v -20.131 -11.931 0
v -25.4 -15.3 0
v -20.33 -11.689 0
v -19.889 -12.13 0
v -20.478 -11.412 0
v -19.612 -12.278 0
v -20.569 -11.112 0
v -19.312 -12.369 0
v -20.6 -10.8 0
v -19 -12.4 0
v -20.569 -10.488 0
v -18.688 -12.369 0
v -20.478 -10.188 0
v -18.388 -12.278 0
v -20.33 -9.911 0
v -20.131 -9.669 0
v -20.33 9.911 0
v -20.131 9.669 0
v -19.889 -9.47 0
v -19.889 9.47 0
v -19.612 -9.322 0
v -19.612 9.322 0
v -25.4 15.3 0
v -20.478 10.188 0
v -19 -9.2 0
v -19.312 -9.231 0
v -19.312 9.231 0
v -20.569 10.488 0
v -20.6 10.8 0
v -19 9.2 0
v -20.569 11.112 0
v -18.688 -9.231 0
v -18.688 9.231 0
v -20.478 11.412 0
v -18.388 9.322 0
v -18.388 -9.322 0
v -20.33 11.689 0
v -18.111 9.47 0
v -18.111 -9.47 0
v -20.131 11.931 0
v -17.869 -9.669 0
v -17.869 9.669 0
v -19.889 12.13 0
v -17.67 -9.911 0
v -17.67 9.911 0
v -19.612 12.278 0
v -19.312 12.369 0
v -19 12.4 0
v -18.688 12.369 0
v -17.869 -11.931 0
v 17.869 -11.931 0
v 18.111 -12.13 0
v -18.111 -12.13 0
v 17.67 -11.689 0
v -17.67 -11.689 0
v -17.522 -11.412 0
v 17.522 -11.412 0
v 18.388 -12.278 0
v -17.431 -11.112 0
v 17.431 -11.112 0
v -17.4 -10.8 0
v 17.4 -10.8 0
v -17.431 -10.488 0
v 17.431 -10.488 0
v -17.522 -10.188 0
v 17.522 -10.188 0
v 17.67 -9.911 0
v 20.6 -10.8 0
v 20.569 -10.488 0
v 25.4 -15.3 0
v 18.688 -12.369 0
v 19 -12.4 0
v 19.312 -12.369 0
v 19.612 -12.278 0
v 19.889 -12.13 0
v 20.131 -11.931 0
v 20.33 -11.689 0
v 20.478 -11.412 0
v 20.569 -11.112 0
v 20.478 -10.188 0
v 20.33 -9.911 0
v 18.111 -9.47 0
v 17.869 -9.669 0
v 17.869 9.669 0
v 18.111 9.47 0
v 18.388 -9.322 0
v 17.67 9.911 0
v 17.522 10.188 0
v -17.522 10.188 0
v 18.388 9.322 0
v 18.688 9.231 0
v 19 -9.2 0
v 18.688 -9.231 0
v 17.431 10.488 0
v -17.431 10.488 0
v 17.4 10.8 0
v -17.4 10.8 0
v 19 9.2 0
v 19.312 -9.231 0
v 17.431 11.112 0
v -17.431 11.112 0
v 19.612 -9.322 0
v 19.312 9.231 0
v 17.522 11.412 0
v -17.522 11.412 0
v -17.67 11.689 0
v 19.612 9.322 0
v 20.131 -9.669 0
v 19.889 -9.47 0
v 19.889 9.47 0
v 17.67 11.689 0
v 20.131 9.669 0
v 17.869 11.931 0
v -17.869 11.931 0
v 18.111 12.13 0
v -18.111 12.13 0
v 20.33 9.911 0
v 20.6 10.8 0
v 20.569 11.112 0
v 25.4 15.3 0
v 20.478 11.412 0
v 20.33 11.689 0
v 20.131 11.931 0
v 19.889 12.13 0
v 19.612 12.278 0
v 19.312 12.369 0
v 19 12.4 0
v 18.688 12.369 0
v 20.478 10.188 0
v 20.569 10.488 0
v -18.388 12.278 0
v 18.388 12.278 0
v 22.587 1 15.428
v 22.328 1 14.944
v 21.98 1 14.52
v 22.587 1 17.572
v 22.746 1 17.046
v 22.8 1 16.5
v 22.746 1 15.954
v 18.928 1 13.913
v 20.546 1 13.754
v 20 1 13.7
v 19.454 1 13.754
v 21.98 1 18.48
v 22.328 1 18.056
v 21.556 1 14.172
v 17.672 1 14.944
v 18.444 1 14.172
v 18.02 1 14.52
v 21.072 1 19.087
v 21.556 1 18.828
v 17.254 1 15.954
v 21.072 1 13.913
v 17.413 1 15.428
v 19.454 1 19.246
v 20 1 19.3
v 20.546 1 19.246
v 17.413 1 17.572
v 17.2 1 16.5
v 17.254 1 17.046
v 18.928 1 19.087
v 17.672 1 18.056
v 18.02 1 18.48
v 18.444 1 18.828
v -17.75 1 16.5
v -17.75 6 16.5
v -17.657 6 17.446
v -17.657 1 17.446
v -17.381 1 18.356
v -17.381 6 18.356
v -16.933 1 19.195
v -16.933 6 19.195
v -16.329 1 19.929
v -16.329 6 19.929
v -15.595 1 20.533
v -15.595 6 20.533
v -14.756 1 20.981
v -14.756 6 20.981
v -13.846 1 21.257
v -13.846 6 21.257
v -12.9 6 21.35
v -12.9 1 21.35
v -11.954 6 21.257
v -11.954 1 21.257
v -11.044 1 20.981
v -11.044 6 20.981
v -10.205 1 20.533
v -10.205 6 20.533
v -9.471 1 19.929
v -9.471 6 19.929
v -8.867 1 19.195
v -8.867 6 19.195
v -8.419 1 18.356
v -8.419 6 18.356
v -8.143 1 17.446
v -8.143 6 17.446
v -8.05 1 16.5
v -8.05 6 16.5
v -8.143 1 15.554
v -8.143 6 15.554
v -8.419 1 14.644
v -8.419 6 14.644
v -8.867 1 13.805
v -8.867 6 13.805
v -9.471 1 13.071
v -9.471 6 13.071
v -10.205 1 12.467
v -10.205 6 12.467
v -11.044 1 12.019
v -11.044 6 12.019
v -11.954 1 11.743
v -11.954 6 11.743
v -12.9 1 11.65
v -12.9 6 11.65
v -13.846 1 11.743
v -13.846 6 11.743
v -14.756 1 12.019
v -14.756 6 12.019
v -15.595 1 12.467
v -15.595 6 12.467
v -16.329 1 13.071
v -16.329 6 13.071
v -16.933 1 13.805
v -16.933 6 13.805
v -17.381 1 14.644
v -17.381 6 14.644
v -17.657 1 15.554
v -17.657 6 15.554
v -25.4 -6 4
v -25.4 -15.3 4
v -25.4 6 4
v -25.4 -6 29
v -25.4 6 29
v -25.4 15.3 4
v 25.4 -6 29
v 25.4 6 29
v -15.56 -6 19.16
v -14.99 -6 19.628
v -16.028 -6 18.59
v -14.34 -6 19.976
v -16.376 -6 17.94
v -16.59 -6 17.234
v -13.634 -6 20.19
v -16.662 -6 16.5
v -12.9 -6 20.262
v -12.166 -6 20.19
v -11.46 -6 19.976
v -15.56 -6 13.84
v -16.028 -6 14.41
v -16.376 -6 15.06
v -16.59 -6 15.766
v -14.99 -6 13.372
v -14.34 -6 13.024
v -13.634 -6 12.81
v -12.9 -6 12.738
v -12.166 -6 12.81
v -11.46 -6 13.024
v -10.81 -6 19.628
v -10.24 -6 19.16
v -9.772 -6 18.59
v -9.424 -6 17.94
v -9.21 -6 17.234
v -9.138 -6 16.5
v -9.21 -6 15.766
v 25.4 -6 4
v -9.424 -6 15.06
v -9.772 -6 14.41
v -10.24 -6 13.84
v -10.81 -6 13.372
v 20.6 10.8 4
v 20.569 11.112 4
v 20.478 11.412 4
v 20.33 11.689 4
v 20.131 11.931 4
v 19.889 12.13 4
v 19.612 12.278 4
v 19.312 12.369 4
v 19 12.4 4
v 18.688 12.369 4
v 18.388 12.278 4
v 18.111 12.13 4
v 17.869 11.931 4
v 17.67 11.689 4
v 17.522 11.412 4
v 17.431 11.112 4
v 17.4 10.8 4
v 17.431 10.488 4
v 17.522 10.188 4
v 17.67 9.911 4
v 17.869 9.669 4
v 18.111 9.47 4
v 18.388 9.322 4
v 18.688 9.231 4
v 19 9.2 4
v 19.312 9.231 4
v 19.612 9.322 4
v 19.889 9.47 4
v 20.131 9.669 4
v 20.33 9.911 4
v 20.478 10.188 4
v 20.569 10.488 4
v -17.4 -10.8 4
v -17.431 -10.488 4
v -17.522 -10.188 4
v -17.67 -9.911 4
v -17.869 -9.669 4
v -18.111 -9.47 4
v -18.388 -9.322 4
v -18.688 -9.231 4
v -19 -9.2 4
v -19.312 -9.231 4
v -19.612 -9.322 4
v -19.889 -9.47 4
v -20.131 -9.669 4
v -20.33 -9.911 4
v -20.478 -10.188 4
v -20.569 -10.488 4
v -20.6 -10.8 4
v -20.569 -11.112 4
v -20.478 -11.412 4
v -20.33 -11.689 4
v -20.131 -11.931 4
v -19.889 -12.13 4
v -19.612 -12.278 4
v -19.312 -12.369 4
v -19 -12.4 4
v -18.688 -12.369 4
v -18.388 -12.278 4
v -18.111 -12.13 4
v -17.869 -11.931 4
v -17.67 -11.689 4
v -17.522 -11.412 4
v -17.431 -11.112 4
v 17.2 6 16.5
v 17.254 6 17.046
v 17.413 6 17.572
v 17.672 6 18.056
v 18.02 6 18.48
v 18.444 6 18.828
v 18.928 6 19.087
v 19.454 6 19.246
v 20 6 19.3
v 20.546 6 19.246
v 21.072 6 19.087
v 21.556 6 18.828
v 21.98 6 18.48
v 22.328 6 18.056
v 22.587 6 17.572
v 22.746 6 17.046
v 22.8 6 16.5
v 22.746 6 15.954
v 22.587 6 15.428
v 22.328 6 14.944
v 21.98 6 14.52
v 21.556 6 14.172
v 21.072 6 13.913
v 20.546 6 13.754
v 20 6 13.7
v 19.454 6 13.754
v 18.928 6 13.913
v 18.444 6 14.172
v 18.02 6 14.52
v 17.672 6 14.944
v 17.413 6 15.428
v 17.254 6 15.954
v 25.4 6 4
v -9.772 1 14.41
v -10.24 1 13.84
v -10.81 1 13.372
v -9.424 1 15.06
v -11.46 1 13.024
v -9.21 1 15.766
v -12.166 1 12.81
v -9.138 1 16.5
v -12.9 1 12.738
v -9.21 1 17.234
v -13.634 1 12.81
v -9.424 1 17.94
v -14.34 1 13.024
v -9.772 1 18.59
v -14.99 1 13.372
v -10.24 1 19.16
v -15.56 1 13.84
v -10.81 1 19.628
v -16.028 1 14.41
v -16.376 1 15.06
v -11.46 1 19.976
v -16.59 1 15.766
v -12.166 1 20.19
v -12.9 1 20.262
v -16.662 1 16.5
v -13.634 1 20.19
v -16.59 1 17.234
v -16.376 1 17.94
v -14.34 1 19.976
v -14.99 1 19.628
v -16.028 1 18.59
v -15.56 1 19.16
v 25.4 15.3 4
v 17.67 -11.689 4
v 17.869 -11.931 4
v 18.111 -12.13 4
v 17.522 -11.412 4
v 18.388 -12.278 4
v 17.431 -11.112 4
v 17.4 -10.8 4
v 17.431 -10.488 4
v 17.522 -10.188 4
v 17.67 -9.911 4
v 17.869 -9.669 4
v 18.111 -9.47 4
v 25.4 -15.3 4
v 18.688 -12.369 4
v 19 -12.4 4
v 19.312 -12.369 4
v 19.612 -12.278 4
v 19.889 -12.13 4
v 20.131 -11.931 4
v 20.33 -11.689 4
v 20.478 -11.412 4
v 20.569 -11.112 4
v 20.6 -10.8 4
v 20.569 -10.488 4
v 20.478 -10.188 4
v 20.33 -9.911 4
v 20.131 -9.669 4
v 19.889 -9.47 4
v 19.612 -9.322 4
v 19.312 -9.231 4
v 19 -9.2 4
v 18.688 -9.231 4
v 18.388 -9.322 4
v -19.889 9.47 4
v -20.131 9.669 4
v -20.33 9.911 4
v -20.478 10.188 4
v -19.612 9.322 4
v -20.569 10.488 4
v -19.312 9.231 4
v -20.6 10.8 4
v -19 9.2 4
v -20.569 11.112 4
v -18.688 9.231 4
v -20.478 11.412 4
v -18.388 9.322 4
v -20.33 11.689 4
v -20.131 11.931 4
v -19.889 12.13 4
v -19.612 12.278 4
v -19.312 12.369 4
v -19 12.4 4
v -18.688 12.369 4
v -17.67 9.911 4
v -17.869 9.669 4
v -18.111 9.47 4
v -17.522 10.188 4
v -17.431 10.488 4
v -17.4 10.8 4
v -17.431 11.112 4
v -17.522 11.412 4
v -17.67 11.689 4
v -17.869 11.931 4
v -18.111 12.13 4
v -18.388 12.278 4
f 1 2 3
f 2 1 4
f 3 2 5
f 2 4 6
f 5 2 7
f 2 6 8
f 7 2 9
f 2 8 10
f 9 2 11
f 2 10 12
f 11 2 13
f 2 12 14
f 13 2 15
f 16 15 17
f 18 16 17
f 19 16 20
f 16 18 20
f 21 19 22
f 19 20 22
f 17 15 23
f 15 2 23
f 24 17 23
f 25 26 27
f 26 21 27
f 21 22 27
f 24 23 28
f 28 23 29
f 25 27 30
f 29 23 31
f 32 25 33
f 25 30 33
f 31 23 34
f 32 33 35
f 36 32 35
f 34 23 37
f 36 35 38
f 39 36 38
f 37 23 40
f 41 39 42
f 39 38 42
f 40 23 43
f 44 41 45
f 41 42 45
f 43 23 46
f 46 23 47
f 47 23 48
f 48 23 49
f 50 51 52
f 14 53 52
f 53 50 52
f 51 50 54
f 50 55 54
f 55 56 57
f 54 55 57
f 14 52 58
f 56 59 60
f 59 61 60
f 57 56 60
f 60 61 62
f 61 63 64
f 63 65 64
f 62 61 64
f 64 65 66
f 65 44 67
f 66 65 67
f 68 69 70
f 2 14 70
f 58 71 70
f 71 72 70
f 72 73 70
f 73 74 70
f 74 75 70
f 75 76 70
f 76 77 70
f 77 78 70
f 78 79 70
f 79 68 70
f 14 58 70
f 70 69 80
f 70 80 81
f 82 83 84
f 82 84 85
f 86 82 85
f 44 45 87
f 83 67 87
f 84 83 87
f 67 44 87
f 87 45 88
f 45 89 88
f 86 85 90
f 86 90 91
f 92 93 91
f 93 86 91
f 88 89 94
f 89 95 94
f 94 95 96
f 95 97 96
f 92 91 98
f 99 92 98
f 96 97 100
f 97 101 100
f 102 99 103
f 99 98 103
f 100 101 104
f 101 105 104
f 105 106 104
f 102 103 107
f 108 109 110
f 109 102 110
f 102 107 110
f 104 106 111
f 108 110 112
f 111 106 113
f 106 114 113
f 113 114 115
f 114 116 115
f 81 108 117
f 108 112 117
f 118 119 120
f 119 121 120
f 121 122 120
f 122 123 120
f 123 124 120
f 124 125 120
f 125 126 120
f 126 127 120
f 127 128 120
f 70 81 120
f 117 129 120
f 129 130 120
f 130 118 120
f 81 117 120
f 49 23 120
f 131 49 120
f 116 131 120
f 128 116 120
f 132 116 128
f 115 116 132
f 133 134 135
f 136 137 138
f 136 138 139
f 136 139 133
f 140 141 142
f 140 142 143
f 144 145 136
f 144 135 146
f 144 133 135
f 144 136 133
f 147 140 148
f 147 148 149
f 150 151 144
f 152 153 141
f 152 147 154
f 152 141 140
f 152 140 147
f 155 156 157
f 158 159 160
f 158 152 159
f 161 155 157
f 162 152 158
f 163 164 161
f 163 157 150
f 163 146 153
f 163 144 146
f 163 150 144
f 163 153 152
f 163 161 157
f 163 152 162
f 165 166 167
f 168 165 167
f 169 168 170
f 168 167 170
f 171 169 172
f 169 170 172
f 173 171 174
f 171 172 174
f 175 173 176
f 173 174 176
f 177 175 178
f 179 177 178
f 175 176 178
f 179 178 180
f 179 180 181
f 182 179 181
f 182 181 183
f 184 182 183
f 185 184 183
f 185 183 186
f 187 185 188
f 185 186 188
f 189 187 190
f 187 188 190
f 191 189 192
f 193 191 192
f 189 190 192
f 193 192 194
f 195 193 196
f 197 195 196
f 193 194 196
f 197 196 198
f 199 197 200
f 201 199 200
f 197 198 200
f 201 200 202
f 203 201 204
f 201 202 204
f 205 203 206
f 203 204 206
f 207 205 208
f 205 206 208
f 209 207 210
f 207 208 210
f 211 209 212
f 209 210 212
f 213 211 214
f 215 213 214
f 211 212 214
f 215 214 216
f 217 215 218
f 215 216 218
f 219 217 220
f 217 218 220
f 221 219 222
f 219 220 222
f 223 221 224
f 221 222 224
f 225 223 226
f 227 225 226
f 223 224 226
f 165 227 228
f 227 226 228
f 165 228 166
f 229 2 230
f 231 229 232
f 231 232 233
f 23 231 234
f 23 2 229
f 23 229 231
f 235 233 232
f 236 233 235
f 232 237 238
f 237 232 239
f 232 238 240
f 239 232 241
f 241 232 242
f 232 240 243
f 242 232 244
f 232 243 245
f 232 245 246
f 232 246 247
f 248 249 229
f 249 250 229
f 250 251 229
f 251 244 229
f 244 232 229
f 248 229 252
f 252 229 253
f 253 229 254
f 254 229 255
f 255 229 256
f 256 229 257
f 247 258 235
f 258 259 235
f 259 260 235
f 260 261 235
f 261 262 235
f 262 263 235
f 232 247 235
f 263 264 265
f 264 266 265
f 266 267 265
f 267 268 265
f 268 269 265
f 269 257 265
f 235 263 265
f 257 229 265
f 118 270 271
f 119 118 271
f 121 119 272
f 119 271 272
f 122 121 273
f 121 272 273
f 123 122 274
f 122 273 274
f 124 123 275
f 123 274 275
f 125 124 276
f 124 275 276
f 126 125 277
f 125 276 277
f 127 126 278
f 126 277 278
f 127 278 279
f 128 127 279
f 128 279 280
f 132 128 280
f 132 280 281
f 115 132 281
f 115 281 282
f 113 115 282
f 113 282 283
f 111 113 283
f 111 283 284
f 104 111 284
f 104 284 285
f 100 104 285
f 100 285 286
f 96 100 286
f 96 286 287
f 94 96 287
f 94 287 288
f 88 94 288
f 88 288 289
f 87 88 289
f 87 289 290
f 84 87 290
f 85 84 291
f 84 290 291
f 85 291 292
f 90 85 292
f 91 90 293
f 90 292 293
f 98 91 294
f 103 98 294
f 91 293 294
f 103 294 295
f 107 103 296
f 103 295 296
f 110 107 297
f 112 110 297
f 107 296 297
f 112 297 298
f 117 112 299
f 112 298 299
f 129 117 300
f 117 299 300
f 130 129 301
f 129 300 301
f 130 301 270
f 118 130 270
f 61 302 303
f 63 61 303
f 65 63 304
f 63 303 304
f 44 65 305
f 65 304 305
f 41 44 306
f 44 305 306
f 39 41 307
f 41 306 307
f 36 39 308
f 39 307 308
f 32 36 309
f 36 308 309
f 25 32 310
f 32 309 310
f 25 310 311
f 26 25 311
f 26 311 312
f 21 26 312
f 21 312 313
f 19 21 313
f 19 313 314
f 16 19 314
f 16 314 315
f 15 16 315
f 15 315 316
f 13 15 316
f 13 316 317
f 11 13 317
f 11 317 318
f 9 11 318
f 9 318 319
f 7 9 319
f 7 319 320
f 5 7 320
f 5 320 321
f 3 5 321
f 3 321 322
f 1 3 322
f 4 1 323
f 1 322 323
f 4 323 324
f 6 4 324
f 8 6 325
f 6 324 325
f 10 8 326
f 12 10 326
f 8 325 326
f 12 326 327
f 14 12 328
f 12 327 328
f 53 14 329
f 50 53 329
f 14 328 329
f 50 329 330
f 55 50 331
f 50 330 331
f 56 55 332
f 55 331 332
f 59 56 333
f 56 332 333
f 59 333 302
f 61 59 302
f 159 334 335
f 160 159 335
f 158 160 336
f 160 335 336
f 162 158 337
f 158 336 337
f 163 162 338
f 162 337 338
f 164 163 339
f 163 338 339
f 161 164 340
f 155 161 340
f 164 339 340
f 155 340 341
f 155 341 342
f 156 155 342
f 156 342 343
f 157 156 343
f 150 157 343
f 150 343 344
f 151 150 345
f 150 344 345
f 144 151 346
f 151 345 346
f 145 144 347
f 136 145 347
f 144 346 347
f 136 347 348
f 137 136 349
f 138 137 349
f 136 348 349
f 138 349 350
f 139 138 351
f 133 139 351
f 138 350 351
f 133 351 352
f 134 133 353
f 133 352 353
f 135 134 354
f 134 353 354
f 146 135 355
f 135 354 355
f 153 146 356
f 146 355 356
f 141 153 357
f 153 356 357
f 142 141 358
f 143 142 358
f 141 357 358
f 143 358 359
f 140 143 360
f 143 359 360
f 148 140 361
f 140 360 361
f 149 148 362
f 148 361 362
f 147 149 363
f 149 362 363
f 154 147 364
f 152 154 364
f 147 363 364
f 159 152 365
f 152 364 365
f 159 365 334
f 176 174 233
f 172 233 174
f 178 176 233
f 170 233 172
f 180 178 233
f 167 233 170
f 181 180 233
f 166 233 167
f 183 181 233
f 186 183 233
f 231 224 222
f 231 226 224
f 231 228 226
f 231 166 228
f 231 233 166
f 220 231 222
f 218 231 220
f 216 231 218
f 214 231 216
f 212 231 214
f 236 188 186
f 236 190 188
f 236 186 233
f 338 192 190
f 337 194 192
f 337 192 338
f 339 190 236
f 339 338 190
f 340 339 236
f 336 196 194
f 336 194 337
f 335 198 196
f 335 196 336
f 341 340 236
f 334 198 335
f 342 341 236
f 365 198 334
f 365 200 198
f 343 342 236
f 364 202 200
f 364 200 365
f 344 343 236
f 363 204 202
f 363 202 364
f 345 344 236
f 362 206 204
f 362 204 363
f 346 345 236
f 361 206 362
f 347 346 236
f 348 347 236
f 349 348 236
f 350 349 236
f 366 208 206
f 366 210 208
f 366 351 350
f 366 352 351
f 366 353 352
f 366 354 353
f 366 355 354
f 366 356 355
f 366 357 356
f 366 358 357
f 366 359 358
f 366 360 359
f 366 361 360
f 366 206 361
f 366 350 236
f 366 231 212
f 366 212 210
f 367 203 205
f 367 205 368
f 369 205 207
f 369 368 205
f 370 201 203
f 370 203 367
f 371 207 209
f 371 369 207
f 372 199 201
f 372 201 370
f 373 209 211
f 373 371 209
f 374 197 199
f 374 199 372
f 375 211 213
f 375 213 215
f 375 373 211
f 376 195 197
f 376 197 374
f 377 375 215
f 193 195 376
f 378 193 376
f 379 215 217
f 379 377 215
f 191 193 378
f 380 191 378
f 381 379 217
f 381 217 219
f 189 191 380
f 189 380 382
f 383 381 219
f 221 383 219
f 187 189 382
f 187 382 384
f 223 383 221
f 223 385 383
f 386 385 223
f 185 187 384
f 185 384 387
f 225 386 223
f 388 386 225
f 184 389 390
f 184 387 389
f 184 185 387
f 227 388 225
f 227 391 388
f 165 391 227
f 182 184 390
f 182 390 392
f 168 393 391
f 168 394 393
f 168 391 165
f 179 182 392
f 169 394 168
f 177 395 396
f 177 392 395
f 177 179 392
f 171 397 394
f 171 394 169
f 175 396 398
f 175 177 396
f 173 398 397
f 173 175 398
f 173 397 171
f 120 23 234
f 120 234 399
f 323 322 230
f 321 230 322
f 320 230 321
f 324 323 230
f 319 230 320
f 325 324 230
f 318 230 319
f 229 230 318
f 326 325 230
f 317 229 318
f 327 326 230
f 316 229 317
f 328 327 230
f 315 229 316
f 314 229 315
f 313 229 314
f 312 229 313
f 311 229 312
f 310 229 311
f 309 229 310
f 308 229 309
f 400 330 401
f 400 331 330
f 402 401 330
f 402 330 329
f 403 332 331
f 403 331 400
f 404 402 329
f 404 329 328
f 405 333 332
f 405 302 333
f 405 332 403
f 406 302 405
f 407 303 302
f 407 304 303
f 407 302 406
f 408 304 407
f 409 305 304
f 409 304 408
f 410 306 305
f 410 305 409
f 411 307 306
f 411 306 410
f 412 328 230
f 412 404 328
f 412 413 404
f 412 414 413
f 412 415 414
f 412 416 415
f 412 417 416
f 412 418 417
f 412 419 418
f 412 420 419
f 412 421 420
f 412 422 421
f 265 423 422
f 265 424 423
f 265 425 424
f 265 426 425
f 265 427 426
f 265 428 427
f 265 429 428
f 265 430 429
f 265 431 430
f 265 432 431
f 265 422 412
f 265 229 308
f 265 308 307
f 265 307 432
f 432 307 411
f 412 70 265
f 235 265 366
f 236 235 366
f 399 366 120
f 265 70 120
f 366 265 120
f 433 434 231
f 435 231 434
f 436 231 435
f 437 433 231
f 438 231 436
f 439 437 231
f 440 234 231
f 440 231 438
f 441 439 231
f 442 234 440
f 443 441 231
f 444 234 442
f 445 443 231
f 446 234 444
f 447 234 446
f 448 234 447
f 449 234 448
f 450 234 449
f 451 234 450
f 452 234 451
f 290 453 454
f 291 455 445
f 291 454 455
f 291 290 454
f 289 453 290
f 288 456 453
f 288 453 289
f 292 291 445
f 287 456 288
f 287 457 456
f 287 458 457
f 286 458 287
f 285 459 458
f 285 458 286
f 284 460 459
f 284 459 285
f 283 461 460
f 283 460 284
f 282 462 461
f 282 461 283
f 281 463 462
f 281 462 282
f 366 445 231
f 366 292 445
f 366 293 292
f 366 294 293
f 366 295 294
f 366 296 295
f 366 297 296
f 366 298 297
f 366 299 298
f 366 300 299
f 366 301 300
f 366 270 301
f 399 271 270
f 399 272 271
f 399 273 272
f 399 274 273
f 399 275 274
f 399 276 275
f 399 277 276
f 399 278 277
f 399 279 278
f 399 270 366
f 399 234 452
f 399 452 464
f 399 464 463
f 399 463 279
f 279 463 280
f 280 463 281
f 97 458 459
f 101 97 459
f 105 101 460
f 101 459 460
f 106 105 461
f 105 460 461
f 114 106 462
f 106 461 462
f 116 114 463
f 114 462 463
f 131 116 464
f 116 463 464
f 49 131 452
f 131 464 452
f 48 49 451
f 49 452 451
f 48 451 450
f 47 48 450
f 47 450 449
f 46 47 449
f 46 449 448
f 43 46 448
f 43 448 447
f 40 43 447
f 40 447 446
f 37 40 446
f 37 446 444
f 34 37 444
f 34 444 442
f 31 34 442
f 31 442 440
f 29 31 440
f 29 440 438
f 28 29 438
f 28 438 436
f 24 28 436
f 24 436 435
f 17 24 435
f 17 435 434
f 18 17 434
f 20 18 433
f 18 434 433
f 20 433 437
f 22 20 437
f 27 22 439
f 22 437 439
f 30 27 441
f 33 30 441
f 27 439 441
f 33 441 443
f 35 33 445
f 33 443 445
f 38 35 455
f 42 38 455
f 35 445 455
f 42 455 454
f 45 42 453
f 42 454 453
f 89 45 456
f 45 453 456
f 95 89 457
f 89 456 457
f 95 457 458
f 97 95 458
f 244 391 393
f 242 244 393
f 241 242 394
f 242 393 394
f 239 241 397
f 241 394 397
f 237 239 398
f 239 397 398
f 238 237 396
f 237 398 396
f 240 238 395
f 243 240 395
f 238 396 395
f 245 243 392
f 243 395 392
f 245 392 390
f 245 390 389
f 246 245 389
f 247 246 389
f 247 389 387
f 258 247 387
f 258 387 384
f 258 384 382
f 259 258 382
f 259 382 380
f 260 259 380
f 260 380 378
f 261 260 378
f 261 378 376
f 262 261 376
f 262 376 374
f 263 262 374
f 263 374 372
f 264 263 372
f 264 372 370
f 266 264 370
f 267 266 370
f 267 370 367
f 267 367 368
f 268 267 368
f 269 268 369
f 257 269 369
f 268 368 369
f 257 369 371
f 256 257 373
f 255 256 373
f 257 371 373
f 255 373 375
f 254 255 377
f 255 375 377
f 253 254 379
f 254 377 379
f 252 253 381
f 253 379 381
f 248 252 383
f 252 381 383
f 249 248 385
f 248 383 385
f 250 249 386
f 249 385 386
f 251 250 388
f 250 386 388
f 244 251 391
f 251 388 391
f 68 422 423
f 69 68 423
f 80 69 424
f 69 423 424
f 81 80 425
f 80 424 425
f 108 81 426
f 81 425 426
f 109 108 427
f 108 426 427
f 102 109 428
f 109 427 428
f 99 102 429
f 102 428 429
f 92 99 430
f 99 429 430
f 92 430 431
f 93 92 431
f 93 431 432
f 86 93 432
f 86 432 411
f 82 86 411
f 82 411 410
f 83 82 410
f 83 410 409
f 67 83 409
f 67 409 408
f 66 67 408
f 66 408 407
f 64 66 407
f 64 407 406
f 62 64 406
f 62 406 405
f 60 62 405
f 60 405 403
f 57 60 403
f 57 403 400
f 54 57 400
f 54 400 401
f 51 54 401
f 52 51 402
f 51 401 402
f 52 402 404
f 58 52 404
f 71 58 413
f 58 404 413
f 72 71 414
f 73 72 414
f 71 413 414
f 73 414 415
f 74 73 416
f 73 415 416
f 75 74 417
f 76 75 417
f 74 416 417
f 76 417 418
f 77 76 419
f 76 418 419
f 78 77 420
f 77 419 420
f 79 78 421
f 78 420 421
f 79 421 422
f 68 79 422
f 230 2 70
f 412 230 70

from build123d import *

# Parameters (mm, degrees)
SKETCH067_W     = 50.8
SKETCH067_H     = 30.6
PAD014_DEPTH    = 4
SKETCH068_R     = 1.6
POCKET061_DEPTH = 4.001
SKETCH069_W     = 50.8
SKETCH069_H     = 12
PAD015_DEPTH    = 25
SKETCH070_R     = 4.85
POCKET062_DEPTH = 5
SKETCH071_R     = 3.7625
POCKET063_DEPTH = 16.301
SKETCH072_R     = 2.8
POCKET064_DEPTH = 5


with BuildPart() as part:
    # Sketch067 → Pad014 (new body)
    with BuildSketch(Plane.XY):
        Rectangle(SKETCH067_W, SKETCH067_H)
    extrude(amount=PAD014_DEPTH)

    # Sketch068 (on Face6 of Pad014) → Pocket061 (cut, through all)
    with BuildSketch(Plane.XY.offset(4)):
        with Locations((19, 10.8)):
            Circle(SKETCH068_R)
        with Locations((19, -10.8)):
            Circle(SKETCH068_R)
        with Locations((-19, -10.8)):
            Circle(SKETCH068_R)
        with Locations((-19, 10.8)):
            Circle(SKETCH068_R)
    extrude(amount=-POCKET061_DEPTH, mode=Mode.SUBTRACT)

    # Sketch069 (on Face5 of Pocket061) → Pad015 (join)
    with BuildSketch(Plane.XY.offset(4)):
        Rectangle(SKETCH069_W, SKETCH069_H)
    extrude(amount=PAD015_DEPTH)

    # Sketch070 (on Face13 of Pad015) → Pocket062 (cut)
    with BuildSketch(Plane(origin=(0, 6, 0), x_dir=(-1, 0, 0), z_dir=(0, 1, 0))):
        with Locations((12.9, 16.5)):
            Circle(SKETCH070_R)
    extrude(amount=-POCKET062_DEPTH, mode=Mode.SUBTRACT)

    # Sketch071 (on Face18 of Pocket062) → Pocket063 (cut, through all)
    with BuildSketch(Plane(origin=(0, 1, 0), x_dir=(-1, 0, 0), z_dir=(0, 1, 0))):
        with Locations((12.9, 16.5)):
            Circle(SKETCH071_R)
    extrude(amount=-POCKET063_DEPTH, mode=Mode.SUBTRACT)

    # Sketch072 → Pocket064 (cut)
    with BuildSketch(Plane(origin=(0, 6, 0), x_dir=(-1, 0, 0), z_dir=(0, 1, 0))):
        with Locations((-20, 16.5)):
            Circle(SKETCH072_R)
    extrude(amount=-POCKET064_DEPTH, mode=Mode.SUBTRACT)


solid = part.part
